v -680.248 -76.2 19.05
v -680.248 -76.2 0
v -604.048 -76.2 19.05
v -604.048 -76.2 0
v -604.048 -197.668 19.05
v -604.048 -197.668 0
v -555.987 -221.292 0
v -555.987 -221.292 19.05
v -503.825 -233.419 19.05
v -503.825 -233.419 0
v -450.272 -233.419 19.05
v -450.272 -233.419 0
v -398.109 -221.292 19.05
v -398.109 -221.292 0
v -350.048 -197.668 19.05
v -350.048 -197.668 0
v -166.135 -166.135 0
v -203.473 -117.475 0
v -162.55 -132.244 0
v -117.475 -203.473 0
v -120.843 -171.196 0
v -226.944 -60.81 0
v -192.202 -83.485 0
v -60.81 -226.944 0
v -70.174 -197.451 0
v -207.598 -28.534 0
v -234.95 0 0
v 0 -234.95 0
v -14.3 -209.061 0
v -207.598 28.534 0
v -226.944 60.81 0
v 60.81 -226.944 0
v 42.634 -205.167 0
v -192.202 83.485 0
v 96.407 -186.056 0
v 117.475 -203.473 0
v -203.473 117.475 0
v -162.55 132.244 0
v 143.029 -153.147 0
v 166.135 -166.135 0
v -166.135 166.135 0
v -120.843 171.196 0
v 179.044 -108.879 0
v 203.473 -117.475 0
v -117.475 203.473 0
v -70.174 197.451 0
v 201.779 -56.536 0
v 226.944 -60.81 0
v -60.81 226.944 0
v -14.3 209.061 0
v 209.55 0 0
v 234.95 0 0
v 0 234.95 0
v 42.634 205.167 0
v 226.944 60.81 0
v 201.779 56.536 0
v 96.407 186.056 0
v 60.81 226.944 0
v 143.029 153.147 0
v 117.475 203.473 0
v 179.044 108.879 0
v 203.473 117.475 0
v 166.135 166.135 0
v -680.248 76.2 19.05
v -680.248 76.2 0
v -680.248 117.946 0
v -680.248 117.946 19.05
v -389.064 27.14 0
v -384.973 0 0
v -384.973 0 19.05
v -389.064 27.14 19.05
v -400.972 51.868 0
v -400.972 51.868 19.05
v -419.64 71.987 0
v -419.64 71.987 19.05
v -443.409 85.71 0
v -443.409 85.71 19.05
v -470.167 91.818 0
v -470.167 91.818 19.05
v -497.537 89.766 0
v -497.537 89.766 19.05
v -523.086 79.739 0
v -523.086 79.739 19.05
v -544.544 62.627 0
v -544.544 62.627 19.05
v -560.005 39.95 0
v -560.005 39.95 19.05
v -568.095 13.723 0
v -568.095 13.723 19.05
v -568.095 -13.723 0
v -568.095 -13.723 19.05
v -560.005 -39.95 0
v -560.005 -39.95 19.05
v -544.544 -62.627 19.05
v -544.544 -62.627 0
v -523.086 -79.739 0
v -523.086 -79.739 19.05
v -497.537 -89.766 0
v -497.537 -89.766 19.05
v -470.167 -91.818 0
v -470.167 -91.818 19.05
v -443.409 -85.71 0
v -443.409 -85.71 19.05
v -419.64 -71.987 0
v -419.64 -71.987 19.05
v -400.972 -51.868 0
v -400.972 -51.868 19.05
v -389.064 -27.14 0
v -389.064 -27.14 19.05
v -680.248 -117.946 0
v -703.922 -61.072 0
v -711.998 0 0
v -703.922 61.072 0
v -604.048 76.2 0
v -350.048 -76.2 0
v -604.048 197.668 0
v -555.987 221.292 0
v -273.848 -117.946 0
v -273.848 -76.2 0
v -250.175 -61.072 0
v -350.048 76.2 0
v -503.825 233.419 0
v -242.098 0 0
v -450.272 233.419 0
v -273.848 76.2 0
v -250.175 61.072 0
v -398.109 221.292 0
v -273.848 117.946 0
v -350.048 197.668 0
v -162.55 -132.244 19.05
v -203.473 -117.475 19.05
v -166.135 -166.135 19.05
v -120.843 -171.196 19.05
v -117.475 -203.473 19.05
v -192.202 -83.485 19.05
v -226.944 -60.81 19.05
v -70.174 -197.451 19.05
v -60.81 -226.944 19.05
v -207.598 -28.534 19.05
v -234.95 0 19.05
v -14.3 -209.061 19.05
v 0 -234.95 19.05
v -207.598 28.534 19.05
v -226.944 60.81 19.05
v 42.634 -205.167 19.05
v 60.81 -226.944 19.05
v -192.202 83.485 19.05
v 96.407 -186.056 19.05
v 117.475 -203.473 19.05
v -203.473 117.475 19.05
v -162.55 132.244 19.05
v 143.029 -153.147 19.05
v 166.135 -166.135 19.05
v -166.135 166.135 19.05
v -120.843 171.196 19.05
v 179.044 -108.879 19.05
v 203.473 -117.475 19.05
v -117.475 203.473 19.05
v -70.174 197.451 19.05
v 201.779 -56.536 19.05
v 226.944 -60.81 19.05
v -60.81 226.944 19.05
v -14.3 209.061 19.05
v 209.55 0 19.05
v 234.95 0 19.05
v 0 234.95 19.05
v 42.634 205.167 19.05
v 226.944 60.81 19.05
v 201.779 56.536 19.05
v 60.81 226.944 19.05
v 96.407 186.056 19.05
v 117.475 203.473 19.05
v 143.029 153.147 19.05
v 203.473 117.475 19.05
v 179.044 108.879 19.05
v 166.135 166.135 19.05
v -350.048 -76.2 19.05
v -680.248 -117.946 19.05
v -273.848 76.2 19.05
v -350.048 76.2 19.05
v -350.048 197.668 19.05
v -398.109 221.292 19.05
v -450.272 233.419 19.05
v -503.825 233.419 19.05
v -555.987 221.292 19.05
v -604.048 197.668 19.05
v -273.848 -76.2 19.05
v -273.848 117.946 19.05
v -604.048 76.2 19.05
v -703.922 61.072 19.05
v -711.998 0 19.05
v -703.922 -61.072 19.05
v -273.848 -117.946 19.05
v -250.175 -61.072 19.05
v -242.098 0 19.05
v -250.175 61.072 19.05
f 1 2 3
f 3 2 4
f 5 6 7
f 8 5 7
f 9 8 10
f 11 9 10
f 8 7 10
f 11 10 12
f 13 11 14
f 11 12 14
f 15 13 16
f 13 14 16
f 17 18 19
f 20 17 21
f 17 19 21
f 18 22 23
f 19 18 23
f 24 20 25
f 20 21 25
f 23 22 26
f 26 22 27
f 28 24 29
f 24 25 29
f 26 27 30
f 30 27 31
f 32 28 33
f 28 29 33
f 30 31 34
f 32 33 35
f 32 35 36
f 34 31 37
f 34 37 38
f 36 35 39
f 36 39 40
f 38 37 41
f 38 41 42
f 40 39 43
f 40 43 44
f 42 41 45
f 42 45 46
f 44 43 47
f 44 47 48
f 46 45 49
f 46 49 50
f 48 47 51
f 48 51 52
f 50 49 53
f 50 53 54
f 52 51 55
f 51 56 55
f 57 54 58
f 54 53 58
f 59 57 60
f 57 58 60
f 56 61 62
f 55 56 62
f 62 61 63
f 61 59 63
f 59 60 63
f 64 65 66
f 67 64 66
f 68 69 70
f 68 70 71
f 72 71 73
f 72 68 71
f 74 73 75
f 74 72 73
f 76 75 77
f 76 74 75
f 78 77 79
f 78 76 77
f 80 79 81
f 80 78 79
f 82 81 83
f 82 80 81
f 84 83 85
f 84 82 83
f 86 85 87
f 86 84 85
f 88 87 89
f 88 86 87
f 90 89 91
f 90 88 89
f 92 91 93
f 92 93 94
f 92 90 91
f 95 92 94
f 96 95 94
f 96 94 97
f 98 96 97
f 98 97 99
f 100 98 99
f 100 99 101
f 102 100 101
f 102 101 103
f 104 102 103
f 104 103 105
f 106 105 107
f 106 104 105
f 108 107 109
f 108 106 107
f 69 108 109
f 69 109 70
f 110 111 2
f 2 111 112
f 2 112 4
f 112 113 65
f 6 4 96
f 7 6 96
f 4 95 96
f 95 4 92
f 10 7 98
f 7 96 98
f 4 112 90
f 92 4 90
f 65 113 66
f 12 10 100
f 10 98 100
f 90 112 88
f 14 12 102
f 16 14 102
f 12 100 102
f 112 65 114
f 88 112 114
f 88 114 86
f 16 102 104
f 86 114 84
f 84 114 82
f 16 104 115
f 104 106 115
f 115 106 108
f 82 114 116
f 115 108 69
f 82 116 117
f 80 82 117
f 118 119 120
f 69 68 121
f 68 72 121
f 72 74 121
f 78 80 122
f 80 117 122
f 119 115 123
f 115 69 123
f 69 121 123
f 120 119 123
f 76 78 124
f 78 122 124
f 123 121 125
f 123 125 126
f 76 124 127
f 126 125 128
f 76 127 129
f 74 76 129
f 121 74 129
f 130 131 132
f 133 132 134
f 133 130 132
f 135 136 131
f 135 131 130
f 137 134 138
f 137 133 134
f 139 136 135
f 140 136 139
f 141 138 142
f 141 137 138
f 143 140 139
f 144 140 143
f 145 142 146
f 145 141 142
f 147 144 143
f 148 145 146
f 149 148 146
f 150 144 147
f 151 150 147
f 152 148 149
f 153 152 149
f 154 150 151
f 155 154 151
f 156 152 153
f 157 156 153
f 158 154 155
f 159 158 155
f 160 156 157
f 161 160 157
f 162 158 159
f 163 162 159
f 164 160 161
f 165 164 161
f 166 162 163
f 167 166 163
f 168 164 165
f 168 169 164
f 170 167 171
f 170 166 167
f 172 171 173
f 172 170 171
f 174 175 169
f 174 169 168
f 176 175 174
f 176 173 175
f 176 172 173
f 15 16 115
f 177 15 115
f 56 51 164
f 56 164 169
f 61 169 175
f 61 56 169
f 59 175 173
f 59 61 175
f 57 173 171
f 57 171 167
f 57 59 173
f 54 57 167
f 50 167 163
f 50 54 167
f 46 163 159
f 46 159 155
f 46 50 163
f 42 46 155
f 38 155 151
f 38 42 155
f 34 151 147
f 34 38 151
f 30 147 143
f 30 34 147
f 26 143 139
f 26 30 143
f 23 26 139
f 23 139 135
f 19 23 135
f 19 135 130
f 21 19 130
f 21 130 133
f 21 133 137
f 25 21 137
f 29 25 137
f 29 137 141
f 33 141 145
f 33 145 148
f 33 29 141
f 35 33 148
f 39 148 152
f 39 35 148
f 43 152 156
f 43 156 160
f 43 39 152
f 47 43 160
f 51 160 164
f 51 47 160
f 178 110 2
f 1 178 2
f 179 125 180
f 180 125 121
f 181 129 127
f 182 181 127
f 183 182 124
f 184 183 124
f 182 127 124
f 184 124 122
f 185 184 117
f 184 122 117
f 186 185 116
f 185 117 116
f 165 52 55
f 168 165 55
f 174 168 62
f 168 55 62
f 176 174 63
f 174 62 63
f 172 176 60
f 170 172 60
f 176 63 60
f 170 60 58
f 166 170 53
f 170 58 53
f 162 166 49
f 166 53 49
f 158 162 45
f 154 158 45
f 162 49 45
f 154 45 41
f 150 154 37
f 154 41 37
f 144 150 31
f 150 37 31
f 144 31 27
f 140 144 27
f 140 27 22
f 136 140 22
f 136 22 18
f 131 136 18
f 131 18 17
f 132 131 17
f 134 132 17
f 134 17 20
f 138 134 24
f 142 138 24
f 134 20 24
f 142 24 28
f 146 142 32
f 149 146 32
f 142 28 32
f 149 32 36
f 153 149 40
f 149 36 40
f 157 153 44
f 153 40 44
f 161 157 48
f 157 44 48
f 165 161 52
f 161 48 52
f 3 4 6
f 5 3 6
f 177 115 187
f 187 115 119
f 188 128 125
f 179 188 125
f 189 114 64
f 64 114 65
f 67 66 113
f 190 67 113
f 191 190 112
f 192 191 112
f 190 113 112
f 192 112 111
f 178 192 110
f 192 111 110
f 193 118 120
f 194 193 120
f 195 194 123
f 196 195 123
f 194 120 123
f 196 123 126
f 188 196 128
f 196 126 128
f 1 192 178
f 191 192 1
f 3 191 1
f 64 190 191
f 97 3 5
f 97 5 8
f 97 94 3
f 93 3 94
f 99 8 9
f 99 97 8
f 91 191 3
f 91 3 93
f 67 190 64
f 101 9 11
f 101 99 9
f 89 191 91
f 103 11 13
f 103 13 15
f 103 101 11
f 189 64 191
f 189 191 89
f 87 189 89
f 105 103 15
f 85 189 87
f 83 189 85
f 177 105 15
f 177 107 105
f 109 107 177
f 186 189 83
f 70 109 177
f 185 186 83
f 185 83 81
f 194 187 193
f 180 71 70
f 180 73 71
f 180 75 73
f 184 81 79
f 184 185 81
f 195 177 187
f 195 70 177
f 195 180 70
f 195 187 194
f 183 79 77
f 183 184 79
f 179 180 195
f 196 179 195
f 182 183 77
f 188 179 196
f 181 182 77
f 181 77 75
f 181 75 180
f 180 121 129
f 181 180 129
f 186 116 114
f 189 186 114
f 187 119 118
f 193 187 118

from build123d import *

# Parameters (mm, degrees)
F0_R     = 234.95
F0_R_2   = 209.55
F1_DEPTH = 19.05
F2_R     = 92.075
F3_DEPTH = 19.05


with BuildPart() as f1:
    # F0 (on Top) → F1 (new body)
    with BuildSketch(Plane.XY):
        Circle(F0_R)
        Circle(F0_R_2, mode=Mode.SUBTRACT)
    extrude(amount=F1_DEPTH)


with BuildPart() as f3:
    # F2 (on Top) → F3 (new body)
    with BuildSketch(Plane.XY):
        with BuildLine():
            Line((-350.04826, 76.2), (-350.04826, 197.667657))
            ThreePointArc((-350.04826, 197.667657), (-477.04826, 234.95), (-604.04826, 197.667657))
            Line((-604.04826, 197.667657), (-604.04826, 76.2))
            Line((-604.04826, 76.2), (-680.24826, 76.2))
            Line((-680.24826, 76.2), (-680.24826, 117.946015))
            ThreePointArc((-680.24826, 117.946015), (-711.99826, 0), (-680.24826, -117.946015))
            Line((-680.24826, -117.946015), (-680.24826, -76.2))
            Line((-680.24826, -76.2), (-604.04826, -76.2))
            Line((-604.04826, -76.2), (-604.04826, -197.667657))
            ThreePointArc((-604.04826, -197.667657), (-477.04826, -234.95), (-350.04826, -197.667657))
            Line((-350.04826, -197.667657), (-350.04826, -76.2))
            Line((-350.04826, -76.2), (-273.84826, -76.2))
            Line((-273.84826, -76.2), (-273.84826, -117.946015))
            ThreePointArc((-273.84826, -117.946015), (-242.09826, 0), (-273.84826, 117.946015))
            Line((-273.84826, 117.946015), (-273.84826, 76.2))
            Line((-273.84826, 76.2), (-350.04826, 76.2))
        make_face()
        with Locations((-477.04826, 0)):
            Circle(F2_R, mode=Mode.SUBTRACT)
    extrude(amount=F3_DEPTH)


solid = Compound([f1.part, f3.part])
